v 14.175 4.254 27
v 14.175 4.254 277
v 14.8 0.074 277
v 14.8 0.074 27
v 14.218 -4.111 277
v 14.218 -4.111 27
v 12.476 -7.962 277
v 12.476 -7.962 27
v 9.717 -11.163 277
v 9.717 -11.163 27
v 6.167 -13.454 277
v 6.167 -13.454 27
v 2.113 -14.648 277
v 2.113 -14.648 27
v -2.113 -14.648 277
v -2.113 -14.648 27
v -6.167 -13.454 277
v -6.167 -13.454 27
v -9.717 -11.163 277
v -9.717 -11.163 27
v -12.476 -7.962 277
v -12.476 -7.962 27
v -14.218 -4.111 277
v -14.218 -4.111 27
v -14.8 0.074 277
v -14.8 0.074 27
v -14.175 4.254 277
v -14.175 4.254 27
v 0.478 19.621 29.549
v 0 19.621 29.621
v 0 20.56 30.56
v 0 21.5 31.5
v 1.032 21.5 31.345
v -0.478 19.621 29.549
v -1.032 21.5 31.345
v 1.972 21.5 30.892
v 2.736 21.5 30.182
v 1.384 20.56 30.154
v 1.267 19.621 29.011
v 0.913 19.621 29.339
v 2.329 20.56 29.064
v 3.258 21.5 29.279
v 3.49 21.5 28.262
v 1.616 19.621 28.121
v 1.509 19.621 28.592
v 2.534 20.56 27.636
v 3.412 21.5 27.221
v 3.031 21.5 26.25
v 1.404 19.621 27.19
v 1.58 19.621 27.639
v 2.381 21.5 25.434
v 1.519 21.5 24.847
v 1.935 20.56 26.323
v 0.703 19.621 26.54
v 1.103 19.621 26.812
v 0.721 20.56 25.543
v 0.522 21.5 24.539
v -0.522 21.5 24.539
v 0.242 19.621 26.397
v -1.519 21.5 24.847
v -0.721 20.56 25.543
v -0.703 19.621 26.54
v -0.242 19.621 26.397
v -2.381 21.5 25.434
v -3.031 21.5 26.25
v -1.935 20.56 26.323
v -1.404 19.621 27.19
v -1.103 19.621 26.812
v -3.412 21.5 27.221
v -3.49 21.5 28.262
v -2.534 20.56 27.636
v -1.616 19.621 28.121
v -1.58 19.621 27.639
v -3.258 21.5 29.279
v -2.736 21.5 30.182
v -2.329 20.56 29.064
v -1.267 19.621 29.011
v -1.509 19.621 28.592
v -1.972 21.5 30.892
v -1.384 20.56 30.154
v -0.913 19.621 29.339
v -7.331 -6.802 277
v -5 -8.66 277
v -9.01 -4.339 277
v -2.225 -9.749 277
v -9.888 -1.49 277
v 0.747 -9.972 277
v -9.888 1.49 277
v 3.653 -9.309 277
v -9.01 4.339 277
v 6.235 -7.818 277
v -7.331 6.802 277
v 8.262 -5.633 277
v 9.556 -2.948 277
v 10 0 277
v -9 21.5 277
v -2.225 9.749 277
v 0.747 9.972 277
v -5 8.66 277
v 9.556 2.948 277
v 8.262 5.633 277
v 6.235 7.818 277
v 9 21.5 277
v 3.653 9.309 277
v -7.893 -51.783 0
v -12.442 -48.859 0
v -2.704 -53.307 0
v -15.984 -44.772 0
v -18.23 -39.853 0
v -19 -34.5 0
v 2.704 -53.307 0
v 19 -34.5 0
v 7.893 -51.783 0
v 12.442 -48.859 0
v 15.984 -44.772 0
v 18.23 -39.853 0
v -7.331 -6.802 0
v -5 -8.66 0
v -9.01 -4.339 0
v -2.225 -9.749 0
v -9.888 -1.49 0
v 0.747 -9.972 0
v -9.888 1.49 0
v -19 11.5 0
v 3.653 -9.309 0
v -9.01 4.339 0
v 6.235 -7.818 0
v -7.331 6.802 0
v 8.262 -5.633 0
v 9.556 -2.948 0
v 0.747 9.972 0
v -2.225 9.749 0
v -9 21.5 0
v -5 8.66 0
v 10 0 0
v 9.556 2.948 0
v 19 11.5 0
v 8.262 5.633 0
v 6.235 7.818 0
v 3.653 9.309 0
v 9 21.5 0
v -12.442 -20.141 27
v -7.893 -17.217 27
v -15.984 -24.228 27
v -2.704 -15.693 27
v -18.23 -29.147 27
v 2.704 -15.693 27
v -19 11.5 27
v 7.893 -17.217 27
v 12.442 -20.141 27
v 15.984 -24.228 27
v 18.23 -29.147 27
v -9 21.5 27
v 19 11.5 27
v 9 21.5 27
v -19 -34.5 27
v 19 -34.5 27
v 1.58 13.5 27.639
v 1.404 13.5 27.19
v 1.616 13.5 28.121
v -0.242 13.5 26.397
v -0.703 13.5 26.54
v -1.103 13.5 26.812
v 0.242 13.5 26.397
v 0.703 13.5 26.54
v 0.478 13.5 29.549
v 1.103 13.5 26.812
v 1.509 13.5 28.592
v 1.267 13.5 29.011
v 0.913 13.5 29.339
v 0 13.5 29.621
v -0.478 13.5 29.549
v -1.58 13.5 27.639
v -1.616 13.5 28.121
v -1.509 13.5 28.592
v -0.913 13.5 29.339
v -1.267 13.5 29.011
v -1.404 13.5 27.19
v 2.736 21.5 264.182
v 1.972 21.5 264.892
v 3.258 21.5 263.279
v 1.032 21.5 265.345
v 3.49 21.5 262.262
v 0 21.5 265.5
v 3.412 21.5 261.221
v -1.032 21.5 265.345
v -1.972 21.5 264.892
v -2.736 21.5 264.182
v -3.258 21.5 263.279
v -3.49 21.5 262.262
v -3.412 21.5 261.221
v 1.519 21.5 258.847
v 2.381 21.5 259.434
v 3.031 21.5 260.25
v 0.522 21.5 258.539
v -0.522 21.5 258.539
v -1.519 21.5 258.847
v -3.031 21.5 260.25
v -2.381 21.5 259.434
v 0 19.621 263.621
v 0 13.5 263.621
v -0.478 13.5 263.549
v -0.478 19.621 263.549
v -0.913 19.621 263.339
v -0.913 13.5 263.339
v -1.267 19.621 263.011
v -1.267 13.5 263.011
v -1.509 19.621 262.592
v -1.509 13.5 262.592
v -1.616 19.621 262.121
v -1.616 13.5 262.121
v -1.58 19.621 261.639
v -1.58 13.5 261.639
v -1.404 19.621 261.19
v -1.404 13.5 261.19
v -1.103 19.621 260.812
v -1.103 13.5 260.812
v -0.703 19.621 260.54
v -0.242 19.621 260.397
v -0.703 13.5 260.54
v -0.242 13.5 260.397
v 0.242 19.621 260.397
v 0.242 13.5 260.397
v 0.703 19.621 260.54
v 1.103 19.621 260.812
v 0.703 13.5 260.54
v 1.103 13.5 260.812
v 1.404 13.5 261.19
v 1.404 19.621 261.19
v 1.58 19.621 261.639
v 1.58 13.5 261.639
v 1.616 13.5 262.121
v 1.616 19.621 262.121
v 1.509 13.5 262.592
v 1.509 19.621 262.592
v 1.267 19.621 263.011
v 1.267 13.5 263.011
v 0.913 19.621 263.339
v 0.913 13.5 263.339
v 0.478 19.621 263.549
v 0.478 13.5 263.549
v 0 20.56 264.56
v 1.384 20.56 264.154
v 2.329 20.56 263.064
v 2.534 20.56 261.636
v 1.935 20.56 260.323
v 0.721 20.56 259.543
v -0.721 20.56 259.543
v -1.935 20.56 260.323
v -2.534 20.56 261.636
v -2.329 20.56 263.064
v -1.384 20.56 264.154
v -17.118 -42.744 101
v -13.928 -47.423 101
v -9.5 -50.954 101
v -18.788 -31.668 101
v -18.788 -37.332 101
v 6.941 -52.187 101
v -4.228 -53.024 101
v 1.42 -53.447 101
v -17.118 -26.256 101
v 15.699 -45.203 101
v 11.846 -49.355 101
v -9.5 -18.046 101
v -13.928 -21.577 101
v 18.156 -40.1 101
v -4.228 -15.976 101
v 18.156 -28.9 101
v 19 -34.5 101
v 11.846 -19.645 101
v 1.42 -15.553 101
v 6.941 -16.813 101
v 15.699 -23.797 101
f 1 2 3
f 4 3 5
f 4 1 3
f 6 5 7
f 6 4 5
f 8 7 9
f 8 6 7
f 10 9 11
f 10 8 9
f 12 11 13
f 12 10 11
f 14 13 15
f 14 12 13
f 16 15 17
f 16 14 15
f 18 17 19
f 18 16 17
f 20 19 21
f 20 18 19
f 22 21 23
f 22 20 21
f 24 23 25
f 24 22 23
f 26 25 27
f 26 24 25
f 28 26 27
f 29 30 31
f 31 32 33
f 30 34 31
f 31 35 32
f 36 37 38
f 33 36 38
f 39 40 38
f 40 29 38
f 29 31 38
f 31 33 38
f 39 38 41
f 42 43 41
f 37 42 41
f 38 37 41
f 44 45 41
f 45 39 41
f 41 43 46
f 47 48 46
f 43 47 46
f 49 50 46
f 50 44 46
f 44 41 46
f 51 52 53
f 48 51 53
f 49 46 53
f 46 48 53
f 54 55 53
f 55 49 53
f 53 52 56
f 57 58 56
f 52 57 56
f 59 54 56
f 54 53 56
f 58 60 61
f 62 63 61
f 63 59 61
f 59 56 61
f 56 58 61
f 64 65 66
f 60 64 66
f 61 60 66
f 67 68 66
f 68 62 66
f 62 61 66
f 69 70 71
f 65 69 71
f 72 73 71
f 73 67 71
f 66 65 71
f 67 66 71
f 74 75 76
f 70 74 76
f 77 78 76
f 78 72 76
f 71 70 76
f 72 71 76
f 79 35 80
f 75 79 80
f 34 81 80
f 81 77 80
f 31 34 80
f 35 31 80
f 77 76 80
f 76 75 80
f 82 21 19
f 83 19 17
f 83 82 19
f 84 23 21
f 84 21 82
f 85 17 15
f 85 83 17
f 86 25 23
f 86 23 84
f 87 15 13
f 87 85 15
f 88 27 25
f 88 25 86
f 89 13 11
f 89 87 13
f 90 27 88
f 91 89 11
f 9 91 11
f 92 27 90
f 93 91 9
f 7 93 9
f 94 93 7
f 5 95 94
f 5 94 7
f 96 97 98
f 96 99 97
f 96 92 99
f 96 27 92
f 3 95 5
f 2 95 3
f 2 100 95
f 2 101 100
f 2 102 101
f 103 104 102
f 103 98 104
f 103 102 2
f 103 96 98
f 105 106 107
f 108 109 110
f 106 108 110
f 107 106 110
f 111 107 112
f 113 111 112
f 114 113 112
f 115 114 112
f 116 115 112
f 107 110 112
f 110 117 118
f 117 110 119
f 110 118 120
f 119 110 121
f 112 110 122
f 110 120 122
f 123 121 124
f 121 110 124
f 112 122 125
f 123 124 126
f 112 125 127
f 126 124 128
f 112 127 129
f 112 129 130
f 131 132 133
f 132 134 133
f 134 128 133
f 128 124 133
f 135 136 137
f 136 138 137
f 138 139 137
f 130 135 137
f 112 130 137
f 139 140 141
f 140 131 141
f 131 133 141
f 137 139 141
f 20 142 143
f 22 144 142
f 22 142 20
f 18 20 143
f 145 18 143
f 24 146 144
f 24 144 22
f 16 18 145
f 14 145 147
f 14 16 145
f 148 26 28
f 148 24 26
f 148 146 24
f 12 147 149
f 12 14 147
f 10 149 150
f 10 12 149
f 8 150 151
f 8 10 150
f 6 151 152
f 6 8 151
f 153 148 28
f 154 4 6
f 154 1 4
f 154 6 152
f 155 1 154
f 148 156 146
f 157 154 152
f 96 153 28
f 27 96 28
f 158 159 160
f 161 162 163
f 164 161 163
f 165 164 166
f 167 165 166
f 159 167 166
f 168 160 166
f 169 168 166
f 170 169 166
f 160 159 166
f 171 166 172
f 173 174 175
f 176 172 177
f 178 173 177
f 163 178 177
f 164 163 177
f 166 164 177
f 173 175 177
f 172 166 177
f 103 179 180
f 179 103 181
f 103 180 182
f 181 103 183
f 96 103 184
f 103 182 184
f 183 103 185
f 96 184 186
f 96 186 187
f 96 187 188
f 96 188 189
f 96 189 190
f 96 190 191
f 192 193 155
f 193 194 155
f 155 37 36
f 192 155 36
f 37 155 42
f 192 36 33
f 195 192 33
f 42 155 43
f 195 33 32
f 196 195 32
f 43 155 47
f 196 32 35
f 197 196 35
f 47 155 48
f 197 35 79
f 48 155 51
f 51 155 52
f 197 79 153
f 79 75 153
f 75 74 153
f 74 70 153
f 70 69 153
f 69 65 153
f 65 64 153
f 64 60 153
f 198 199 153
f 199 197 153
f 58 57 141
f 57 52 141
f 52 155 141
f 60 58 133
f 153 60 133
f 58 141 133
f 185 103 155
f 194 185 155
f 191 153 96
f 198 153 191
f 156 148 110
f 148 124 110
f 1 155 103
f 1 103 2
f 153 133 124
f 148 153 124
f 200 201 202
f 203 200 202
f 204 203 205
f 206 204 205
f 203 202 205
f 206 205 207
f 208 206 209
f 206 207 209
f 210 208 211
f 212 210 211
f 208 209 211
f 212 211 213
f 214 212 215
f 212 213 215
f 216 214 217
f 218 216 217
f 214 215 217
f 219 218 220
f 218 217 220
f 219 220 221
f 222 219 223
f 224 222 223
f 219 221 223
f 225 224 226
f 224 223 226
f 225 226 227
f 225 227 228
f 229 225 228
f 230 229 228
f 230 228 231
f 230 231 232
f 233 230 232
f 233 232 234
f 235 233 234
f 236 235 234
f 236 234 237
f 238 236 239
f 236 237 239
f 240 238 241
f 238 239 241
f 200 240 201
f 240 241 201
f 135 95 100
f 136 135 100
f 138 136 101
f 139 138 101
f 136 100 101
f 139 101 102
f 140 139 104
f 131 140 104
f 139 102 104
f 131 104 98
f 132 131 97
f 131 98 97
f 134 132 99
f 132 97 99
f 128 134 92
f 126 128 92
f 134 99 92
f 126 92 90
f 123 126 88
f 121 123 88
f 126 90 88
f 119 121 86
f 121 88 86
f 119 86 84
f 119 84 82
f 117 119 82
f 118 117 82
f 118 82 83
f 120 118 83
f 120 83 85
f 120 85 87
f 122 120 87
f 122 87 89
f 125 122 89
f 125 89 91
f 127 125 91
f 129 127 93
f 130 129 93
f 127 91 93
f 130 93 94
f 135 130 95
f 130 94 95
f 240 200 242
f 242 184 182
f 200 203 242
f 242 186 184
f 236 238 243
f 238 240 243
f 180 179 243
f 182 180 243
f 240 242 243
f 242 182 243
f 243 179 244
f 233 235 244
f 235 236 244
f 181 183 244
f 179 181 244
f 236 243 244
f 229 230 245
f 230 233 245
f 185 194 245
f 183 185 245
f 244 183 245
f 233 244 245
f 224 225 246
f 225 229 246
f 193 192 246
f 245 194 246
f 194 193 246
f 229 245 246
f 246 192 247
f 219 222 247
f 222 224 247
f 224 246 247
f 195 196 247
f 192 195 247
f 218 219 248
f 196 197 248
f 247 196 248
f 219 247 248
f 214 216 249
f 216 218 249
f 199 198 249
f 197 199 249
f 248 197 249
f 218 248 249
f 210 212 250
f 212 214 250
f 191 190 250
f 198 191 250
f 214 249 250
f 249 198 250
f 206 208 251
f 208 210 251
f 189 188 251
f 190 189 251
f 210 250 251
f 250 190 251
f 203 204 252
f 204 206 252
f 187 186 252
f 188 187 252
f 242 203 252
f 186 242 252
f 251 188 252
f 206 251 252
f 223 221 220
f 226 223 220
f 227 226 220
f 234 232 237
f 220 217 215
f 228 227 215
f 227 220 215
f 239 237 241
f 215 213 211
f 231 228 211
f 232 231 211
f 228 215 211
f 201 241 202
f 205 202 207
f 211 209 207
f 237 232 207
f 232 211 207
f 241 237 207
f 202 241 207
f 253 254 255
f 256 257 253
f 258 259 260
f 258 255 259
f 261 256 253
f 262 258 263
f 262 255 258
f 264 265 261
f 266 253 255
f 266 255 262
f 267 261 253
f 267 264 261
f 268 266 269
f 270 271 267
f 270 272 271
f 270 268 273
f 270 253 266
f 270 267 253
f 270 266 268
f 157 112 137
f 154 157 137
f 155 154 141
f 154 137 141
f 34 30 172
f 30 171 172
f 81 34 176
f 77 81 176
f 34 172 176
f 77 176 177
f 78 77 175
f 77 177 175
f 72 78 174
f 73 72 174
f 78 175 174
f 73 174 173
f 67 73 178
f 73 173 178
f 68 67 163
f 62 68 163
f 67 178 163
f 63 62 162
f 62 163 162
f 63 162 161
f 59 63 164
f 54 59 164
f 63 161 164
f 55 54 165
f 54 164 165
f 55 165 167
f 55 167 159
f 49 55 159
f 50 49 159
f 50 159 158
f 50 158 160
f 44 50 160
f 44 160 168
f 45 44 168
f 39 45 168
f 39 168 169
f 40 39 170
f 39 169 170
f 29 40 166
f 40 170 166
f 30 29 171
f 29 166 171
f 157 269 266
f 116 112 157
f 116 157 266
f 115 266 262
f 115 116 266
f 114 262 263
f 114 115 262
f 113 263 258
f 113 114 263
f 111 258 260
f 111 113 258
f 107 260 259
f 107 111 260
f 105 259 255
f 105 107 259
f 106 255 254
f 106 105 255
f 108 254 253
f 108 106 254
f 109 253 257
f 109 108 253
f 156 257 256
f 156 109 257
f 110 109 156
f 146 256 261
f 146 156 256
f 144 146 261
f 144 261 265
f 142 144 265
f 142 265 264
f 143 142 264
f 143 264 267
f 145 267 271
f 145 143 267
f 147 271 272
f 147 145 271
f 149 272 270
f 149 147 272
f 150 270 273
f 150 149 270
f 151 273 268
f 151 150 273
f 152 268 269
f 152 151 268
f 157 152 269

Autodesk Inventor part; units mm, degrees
ref_plane "YZ Plane" through (0, 0, 0) normal (1, 0, 0) x (0, 1, 0)
ref_plane "XZ Plane" through (0, 0, 0) normal (0, 1, 0) x (-1, 0, 0)
ref_plane "XY Plane" through (0, 0, 0) normal (0, 0, 1) x (1, 0, 0)
sketch "Sketch1" plane through (0, 0, 0) normal (0, 0, 1) x (1, 0, 0)
  circle A0 centre (0, 0) radius 14.8
  line L0 (-9, 21.5) -> (9, 21.5)
  line L1 (-9, 21.5) -> (-19, 11.5)
  line L2 (-19, 11.5) -> (-19, -34.776357)
  circle A1 centre (0, -34.5) radius 19
  line L3 (0, 21.5) -> (0, -34.5) construction
  line L4 (9, 21.5) -> (19, 11.5)
  line L5 (19, 11.5) -> (19, -34.776357)
  point P0 (-19, -34.5)
  point P1 (19, -34.5)
  dimension "d0" = 29.6
  dimension "d1" = 18
  dimension "d2" = 21.5
  dimension "d3" = 38
  dimension "d4" = 56
  dimension "d5" = 45
sketch "Sketch1 outline for Extrusion1" plane through (0, 0, 0) normal (0, 0, 1) x (1, 0, 0)
  line L0 (19, 11.5) -> (9, 21.5)
  line L1 (19, -34.5) -> (19, 11.5)
  arc A0 (-19, -34.5) -> (19, -34.5) centre (0, -34.5) ccw
  line L2 (-19, 11.5) -> (-19, -34.5)
  line L3 (-9, 21.5) -> (-19, 11.5)
  line L4 (9, 21.5) -> (-9, 21.5)
extrude "Extrusion1" add sketch "Sketch1 outline for Extrusion1" along normal blind 27
sketch "Sketch2" plane through (0, 0, 27) normal (0, 0, 1) x (1, 0, 0)
  line L0 (9, 21.5) -> (-9, 21.5)
  circle A0 centre (0, 0) radius 14.8
  line L1 (-9, 21.5) -> (-14.175455, 4.253996)
  line L2 (9, 21.5) -> (14.175455, 4.253996)
  line L3 (9, 21.5) -> (-9, 21.5)
  line L4 (-9, 21.5) -> (9, 21.5)
  dimension "d8" = 29.6
extrude "Extrusion2" add sketch "Sketch2" along normal blind 250
sketch "Sketch3" plane through (0, 0, 27) normal (0, 0, 1) x (1, 0, 0)
  arc A0 (-19, -34.5) -> (19, -34.5) centre (0, -34.5) ccw projected
  circle A1 centre (0, -34.5) radius 19
  point P0 (0, 0)
  point P1 (19, -34.5)
  point P2 (-19, -34.5)
extrude "Extrusion3" add sketch "Sketch3" along normal blind 74
sketch "Sketch4" plane through (-9, 21.5, 0) normal (0, 1, 0) x (1, 0, 0)
  line L0 (18, 0) -> (0, 0) projected
  line L1 (0, 0) -> (0, -27) projected
  line L2 (0, -27) -> (0, -277) projected
  line L3 (18, -277) -> (0, -277) projected
  line L4 (18, -27) -> (18, -277) projected
  line L5 (18, 0) -> (18, -27) projected
  line L6 (-16, -266.5) -> (34, -266.5)
  point P0 (9, 0)
  point P1 (9, -266.5)
  point P2 (9, -277)
  dimension "d13" = 50
  dimension "d14" = 10.5
split_face "Split1"
sketch "Sketch5" plane through (0, 0, 277) normal (0, 0, 1) x (1, 0, 0)
  circle A0 centre (0, 0) radius 10
  dimension "d15" = 20
extrude "Extrusion4" cut sketch "Sketch5" against normal blind 427
sketch "Sketch6" plane through (-9, 21.5, 0) normal (0, 1, 0) x (1, 0, 0)
  line L0 (18, -266.5) -> (0, -266.5) projected
  line L1 (18, -27) -> (18, -266.5) projected
  line L2 (18, 0) -> (18, -27) projected
  line L3 (18, 0) -> (0, 0) projected
  line L4 (0, 0) -> (0, -27) projected
  line L5 (0, -27) -> (0, -266.5) projected
  line L6 (18, -266.5) -> (0, -266.5) projected
  line L7 (0, -266.5) -> (0, -277) projected
  line L8 (18, -277) -> (0, -277) projected
  line L9 (18, -266.5) -> (18, -277) projected
  point P0 (9, 0)
  point P1 (9, -262)
  point P2 (9, -28)
  point P3 (9, 0)
  point P4 (9, -277)
  dimension "d18" = 28
  dimension "d19" = 15
hole "Hole1" at (0, 21.5, 262) at (0, 21.5, 28) direction (0, -1, 0) diameter 3.242 depth 8 countersink diameter 7 countersink angle 90 thread size "M4x0.7" class "6H" standard "ISO Metric profile"
properties part number "Linear Motor (T-Frame)" material "Aluminum 6061"
